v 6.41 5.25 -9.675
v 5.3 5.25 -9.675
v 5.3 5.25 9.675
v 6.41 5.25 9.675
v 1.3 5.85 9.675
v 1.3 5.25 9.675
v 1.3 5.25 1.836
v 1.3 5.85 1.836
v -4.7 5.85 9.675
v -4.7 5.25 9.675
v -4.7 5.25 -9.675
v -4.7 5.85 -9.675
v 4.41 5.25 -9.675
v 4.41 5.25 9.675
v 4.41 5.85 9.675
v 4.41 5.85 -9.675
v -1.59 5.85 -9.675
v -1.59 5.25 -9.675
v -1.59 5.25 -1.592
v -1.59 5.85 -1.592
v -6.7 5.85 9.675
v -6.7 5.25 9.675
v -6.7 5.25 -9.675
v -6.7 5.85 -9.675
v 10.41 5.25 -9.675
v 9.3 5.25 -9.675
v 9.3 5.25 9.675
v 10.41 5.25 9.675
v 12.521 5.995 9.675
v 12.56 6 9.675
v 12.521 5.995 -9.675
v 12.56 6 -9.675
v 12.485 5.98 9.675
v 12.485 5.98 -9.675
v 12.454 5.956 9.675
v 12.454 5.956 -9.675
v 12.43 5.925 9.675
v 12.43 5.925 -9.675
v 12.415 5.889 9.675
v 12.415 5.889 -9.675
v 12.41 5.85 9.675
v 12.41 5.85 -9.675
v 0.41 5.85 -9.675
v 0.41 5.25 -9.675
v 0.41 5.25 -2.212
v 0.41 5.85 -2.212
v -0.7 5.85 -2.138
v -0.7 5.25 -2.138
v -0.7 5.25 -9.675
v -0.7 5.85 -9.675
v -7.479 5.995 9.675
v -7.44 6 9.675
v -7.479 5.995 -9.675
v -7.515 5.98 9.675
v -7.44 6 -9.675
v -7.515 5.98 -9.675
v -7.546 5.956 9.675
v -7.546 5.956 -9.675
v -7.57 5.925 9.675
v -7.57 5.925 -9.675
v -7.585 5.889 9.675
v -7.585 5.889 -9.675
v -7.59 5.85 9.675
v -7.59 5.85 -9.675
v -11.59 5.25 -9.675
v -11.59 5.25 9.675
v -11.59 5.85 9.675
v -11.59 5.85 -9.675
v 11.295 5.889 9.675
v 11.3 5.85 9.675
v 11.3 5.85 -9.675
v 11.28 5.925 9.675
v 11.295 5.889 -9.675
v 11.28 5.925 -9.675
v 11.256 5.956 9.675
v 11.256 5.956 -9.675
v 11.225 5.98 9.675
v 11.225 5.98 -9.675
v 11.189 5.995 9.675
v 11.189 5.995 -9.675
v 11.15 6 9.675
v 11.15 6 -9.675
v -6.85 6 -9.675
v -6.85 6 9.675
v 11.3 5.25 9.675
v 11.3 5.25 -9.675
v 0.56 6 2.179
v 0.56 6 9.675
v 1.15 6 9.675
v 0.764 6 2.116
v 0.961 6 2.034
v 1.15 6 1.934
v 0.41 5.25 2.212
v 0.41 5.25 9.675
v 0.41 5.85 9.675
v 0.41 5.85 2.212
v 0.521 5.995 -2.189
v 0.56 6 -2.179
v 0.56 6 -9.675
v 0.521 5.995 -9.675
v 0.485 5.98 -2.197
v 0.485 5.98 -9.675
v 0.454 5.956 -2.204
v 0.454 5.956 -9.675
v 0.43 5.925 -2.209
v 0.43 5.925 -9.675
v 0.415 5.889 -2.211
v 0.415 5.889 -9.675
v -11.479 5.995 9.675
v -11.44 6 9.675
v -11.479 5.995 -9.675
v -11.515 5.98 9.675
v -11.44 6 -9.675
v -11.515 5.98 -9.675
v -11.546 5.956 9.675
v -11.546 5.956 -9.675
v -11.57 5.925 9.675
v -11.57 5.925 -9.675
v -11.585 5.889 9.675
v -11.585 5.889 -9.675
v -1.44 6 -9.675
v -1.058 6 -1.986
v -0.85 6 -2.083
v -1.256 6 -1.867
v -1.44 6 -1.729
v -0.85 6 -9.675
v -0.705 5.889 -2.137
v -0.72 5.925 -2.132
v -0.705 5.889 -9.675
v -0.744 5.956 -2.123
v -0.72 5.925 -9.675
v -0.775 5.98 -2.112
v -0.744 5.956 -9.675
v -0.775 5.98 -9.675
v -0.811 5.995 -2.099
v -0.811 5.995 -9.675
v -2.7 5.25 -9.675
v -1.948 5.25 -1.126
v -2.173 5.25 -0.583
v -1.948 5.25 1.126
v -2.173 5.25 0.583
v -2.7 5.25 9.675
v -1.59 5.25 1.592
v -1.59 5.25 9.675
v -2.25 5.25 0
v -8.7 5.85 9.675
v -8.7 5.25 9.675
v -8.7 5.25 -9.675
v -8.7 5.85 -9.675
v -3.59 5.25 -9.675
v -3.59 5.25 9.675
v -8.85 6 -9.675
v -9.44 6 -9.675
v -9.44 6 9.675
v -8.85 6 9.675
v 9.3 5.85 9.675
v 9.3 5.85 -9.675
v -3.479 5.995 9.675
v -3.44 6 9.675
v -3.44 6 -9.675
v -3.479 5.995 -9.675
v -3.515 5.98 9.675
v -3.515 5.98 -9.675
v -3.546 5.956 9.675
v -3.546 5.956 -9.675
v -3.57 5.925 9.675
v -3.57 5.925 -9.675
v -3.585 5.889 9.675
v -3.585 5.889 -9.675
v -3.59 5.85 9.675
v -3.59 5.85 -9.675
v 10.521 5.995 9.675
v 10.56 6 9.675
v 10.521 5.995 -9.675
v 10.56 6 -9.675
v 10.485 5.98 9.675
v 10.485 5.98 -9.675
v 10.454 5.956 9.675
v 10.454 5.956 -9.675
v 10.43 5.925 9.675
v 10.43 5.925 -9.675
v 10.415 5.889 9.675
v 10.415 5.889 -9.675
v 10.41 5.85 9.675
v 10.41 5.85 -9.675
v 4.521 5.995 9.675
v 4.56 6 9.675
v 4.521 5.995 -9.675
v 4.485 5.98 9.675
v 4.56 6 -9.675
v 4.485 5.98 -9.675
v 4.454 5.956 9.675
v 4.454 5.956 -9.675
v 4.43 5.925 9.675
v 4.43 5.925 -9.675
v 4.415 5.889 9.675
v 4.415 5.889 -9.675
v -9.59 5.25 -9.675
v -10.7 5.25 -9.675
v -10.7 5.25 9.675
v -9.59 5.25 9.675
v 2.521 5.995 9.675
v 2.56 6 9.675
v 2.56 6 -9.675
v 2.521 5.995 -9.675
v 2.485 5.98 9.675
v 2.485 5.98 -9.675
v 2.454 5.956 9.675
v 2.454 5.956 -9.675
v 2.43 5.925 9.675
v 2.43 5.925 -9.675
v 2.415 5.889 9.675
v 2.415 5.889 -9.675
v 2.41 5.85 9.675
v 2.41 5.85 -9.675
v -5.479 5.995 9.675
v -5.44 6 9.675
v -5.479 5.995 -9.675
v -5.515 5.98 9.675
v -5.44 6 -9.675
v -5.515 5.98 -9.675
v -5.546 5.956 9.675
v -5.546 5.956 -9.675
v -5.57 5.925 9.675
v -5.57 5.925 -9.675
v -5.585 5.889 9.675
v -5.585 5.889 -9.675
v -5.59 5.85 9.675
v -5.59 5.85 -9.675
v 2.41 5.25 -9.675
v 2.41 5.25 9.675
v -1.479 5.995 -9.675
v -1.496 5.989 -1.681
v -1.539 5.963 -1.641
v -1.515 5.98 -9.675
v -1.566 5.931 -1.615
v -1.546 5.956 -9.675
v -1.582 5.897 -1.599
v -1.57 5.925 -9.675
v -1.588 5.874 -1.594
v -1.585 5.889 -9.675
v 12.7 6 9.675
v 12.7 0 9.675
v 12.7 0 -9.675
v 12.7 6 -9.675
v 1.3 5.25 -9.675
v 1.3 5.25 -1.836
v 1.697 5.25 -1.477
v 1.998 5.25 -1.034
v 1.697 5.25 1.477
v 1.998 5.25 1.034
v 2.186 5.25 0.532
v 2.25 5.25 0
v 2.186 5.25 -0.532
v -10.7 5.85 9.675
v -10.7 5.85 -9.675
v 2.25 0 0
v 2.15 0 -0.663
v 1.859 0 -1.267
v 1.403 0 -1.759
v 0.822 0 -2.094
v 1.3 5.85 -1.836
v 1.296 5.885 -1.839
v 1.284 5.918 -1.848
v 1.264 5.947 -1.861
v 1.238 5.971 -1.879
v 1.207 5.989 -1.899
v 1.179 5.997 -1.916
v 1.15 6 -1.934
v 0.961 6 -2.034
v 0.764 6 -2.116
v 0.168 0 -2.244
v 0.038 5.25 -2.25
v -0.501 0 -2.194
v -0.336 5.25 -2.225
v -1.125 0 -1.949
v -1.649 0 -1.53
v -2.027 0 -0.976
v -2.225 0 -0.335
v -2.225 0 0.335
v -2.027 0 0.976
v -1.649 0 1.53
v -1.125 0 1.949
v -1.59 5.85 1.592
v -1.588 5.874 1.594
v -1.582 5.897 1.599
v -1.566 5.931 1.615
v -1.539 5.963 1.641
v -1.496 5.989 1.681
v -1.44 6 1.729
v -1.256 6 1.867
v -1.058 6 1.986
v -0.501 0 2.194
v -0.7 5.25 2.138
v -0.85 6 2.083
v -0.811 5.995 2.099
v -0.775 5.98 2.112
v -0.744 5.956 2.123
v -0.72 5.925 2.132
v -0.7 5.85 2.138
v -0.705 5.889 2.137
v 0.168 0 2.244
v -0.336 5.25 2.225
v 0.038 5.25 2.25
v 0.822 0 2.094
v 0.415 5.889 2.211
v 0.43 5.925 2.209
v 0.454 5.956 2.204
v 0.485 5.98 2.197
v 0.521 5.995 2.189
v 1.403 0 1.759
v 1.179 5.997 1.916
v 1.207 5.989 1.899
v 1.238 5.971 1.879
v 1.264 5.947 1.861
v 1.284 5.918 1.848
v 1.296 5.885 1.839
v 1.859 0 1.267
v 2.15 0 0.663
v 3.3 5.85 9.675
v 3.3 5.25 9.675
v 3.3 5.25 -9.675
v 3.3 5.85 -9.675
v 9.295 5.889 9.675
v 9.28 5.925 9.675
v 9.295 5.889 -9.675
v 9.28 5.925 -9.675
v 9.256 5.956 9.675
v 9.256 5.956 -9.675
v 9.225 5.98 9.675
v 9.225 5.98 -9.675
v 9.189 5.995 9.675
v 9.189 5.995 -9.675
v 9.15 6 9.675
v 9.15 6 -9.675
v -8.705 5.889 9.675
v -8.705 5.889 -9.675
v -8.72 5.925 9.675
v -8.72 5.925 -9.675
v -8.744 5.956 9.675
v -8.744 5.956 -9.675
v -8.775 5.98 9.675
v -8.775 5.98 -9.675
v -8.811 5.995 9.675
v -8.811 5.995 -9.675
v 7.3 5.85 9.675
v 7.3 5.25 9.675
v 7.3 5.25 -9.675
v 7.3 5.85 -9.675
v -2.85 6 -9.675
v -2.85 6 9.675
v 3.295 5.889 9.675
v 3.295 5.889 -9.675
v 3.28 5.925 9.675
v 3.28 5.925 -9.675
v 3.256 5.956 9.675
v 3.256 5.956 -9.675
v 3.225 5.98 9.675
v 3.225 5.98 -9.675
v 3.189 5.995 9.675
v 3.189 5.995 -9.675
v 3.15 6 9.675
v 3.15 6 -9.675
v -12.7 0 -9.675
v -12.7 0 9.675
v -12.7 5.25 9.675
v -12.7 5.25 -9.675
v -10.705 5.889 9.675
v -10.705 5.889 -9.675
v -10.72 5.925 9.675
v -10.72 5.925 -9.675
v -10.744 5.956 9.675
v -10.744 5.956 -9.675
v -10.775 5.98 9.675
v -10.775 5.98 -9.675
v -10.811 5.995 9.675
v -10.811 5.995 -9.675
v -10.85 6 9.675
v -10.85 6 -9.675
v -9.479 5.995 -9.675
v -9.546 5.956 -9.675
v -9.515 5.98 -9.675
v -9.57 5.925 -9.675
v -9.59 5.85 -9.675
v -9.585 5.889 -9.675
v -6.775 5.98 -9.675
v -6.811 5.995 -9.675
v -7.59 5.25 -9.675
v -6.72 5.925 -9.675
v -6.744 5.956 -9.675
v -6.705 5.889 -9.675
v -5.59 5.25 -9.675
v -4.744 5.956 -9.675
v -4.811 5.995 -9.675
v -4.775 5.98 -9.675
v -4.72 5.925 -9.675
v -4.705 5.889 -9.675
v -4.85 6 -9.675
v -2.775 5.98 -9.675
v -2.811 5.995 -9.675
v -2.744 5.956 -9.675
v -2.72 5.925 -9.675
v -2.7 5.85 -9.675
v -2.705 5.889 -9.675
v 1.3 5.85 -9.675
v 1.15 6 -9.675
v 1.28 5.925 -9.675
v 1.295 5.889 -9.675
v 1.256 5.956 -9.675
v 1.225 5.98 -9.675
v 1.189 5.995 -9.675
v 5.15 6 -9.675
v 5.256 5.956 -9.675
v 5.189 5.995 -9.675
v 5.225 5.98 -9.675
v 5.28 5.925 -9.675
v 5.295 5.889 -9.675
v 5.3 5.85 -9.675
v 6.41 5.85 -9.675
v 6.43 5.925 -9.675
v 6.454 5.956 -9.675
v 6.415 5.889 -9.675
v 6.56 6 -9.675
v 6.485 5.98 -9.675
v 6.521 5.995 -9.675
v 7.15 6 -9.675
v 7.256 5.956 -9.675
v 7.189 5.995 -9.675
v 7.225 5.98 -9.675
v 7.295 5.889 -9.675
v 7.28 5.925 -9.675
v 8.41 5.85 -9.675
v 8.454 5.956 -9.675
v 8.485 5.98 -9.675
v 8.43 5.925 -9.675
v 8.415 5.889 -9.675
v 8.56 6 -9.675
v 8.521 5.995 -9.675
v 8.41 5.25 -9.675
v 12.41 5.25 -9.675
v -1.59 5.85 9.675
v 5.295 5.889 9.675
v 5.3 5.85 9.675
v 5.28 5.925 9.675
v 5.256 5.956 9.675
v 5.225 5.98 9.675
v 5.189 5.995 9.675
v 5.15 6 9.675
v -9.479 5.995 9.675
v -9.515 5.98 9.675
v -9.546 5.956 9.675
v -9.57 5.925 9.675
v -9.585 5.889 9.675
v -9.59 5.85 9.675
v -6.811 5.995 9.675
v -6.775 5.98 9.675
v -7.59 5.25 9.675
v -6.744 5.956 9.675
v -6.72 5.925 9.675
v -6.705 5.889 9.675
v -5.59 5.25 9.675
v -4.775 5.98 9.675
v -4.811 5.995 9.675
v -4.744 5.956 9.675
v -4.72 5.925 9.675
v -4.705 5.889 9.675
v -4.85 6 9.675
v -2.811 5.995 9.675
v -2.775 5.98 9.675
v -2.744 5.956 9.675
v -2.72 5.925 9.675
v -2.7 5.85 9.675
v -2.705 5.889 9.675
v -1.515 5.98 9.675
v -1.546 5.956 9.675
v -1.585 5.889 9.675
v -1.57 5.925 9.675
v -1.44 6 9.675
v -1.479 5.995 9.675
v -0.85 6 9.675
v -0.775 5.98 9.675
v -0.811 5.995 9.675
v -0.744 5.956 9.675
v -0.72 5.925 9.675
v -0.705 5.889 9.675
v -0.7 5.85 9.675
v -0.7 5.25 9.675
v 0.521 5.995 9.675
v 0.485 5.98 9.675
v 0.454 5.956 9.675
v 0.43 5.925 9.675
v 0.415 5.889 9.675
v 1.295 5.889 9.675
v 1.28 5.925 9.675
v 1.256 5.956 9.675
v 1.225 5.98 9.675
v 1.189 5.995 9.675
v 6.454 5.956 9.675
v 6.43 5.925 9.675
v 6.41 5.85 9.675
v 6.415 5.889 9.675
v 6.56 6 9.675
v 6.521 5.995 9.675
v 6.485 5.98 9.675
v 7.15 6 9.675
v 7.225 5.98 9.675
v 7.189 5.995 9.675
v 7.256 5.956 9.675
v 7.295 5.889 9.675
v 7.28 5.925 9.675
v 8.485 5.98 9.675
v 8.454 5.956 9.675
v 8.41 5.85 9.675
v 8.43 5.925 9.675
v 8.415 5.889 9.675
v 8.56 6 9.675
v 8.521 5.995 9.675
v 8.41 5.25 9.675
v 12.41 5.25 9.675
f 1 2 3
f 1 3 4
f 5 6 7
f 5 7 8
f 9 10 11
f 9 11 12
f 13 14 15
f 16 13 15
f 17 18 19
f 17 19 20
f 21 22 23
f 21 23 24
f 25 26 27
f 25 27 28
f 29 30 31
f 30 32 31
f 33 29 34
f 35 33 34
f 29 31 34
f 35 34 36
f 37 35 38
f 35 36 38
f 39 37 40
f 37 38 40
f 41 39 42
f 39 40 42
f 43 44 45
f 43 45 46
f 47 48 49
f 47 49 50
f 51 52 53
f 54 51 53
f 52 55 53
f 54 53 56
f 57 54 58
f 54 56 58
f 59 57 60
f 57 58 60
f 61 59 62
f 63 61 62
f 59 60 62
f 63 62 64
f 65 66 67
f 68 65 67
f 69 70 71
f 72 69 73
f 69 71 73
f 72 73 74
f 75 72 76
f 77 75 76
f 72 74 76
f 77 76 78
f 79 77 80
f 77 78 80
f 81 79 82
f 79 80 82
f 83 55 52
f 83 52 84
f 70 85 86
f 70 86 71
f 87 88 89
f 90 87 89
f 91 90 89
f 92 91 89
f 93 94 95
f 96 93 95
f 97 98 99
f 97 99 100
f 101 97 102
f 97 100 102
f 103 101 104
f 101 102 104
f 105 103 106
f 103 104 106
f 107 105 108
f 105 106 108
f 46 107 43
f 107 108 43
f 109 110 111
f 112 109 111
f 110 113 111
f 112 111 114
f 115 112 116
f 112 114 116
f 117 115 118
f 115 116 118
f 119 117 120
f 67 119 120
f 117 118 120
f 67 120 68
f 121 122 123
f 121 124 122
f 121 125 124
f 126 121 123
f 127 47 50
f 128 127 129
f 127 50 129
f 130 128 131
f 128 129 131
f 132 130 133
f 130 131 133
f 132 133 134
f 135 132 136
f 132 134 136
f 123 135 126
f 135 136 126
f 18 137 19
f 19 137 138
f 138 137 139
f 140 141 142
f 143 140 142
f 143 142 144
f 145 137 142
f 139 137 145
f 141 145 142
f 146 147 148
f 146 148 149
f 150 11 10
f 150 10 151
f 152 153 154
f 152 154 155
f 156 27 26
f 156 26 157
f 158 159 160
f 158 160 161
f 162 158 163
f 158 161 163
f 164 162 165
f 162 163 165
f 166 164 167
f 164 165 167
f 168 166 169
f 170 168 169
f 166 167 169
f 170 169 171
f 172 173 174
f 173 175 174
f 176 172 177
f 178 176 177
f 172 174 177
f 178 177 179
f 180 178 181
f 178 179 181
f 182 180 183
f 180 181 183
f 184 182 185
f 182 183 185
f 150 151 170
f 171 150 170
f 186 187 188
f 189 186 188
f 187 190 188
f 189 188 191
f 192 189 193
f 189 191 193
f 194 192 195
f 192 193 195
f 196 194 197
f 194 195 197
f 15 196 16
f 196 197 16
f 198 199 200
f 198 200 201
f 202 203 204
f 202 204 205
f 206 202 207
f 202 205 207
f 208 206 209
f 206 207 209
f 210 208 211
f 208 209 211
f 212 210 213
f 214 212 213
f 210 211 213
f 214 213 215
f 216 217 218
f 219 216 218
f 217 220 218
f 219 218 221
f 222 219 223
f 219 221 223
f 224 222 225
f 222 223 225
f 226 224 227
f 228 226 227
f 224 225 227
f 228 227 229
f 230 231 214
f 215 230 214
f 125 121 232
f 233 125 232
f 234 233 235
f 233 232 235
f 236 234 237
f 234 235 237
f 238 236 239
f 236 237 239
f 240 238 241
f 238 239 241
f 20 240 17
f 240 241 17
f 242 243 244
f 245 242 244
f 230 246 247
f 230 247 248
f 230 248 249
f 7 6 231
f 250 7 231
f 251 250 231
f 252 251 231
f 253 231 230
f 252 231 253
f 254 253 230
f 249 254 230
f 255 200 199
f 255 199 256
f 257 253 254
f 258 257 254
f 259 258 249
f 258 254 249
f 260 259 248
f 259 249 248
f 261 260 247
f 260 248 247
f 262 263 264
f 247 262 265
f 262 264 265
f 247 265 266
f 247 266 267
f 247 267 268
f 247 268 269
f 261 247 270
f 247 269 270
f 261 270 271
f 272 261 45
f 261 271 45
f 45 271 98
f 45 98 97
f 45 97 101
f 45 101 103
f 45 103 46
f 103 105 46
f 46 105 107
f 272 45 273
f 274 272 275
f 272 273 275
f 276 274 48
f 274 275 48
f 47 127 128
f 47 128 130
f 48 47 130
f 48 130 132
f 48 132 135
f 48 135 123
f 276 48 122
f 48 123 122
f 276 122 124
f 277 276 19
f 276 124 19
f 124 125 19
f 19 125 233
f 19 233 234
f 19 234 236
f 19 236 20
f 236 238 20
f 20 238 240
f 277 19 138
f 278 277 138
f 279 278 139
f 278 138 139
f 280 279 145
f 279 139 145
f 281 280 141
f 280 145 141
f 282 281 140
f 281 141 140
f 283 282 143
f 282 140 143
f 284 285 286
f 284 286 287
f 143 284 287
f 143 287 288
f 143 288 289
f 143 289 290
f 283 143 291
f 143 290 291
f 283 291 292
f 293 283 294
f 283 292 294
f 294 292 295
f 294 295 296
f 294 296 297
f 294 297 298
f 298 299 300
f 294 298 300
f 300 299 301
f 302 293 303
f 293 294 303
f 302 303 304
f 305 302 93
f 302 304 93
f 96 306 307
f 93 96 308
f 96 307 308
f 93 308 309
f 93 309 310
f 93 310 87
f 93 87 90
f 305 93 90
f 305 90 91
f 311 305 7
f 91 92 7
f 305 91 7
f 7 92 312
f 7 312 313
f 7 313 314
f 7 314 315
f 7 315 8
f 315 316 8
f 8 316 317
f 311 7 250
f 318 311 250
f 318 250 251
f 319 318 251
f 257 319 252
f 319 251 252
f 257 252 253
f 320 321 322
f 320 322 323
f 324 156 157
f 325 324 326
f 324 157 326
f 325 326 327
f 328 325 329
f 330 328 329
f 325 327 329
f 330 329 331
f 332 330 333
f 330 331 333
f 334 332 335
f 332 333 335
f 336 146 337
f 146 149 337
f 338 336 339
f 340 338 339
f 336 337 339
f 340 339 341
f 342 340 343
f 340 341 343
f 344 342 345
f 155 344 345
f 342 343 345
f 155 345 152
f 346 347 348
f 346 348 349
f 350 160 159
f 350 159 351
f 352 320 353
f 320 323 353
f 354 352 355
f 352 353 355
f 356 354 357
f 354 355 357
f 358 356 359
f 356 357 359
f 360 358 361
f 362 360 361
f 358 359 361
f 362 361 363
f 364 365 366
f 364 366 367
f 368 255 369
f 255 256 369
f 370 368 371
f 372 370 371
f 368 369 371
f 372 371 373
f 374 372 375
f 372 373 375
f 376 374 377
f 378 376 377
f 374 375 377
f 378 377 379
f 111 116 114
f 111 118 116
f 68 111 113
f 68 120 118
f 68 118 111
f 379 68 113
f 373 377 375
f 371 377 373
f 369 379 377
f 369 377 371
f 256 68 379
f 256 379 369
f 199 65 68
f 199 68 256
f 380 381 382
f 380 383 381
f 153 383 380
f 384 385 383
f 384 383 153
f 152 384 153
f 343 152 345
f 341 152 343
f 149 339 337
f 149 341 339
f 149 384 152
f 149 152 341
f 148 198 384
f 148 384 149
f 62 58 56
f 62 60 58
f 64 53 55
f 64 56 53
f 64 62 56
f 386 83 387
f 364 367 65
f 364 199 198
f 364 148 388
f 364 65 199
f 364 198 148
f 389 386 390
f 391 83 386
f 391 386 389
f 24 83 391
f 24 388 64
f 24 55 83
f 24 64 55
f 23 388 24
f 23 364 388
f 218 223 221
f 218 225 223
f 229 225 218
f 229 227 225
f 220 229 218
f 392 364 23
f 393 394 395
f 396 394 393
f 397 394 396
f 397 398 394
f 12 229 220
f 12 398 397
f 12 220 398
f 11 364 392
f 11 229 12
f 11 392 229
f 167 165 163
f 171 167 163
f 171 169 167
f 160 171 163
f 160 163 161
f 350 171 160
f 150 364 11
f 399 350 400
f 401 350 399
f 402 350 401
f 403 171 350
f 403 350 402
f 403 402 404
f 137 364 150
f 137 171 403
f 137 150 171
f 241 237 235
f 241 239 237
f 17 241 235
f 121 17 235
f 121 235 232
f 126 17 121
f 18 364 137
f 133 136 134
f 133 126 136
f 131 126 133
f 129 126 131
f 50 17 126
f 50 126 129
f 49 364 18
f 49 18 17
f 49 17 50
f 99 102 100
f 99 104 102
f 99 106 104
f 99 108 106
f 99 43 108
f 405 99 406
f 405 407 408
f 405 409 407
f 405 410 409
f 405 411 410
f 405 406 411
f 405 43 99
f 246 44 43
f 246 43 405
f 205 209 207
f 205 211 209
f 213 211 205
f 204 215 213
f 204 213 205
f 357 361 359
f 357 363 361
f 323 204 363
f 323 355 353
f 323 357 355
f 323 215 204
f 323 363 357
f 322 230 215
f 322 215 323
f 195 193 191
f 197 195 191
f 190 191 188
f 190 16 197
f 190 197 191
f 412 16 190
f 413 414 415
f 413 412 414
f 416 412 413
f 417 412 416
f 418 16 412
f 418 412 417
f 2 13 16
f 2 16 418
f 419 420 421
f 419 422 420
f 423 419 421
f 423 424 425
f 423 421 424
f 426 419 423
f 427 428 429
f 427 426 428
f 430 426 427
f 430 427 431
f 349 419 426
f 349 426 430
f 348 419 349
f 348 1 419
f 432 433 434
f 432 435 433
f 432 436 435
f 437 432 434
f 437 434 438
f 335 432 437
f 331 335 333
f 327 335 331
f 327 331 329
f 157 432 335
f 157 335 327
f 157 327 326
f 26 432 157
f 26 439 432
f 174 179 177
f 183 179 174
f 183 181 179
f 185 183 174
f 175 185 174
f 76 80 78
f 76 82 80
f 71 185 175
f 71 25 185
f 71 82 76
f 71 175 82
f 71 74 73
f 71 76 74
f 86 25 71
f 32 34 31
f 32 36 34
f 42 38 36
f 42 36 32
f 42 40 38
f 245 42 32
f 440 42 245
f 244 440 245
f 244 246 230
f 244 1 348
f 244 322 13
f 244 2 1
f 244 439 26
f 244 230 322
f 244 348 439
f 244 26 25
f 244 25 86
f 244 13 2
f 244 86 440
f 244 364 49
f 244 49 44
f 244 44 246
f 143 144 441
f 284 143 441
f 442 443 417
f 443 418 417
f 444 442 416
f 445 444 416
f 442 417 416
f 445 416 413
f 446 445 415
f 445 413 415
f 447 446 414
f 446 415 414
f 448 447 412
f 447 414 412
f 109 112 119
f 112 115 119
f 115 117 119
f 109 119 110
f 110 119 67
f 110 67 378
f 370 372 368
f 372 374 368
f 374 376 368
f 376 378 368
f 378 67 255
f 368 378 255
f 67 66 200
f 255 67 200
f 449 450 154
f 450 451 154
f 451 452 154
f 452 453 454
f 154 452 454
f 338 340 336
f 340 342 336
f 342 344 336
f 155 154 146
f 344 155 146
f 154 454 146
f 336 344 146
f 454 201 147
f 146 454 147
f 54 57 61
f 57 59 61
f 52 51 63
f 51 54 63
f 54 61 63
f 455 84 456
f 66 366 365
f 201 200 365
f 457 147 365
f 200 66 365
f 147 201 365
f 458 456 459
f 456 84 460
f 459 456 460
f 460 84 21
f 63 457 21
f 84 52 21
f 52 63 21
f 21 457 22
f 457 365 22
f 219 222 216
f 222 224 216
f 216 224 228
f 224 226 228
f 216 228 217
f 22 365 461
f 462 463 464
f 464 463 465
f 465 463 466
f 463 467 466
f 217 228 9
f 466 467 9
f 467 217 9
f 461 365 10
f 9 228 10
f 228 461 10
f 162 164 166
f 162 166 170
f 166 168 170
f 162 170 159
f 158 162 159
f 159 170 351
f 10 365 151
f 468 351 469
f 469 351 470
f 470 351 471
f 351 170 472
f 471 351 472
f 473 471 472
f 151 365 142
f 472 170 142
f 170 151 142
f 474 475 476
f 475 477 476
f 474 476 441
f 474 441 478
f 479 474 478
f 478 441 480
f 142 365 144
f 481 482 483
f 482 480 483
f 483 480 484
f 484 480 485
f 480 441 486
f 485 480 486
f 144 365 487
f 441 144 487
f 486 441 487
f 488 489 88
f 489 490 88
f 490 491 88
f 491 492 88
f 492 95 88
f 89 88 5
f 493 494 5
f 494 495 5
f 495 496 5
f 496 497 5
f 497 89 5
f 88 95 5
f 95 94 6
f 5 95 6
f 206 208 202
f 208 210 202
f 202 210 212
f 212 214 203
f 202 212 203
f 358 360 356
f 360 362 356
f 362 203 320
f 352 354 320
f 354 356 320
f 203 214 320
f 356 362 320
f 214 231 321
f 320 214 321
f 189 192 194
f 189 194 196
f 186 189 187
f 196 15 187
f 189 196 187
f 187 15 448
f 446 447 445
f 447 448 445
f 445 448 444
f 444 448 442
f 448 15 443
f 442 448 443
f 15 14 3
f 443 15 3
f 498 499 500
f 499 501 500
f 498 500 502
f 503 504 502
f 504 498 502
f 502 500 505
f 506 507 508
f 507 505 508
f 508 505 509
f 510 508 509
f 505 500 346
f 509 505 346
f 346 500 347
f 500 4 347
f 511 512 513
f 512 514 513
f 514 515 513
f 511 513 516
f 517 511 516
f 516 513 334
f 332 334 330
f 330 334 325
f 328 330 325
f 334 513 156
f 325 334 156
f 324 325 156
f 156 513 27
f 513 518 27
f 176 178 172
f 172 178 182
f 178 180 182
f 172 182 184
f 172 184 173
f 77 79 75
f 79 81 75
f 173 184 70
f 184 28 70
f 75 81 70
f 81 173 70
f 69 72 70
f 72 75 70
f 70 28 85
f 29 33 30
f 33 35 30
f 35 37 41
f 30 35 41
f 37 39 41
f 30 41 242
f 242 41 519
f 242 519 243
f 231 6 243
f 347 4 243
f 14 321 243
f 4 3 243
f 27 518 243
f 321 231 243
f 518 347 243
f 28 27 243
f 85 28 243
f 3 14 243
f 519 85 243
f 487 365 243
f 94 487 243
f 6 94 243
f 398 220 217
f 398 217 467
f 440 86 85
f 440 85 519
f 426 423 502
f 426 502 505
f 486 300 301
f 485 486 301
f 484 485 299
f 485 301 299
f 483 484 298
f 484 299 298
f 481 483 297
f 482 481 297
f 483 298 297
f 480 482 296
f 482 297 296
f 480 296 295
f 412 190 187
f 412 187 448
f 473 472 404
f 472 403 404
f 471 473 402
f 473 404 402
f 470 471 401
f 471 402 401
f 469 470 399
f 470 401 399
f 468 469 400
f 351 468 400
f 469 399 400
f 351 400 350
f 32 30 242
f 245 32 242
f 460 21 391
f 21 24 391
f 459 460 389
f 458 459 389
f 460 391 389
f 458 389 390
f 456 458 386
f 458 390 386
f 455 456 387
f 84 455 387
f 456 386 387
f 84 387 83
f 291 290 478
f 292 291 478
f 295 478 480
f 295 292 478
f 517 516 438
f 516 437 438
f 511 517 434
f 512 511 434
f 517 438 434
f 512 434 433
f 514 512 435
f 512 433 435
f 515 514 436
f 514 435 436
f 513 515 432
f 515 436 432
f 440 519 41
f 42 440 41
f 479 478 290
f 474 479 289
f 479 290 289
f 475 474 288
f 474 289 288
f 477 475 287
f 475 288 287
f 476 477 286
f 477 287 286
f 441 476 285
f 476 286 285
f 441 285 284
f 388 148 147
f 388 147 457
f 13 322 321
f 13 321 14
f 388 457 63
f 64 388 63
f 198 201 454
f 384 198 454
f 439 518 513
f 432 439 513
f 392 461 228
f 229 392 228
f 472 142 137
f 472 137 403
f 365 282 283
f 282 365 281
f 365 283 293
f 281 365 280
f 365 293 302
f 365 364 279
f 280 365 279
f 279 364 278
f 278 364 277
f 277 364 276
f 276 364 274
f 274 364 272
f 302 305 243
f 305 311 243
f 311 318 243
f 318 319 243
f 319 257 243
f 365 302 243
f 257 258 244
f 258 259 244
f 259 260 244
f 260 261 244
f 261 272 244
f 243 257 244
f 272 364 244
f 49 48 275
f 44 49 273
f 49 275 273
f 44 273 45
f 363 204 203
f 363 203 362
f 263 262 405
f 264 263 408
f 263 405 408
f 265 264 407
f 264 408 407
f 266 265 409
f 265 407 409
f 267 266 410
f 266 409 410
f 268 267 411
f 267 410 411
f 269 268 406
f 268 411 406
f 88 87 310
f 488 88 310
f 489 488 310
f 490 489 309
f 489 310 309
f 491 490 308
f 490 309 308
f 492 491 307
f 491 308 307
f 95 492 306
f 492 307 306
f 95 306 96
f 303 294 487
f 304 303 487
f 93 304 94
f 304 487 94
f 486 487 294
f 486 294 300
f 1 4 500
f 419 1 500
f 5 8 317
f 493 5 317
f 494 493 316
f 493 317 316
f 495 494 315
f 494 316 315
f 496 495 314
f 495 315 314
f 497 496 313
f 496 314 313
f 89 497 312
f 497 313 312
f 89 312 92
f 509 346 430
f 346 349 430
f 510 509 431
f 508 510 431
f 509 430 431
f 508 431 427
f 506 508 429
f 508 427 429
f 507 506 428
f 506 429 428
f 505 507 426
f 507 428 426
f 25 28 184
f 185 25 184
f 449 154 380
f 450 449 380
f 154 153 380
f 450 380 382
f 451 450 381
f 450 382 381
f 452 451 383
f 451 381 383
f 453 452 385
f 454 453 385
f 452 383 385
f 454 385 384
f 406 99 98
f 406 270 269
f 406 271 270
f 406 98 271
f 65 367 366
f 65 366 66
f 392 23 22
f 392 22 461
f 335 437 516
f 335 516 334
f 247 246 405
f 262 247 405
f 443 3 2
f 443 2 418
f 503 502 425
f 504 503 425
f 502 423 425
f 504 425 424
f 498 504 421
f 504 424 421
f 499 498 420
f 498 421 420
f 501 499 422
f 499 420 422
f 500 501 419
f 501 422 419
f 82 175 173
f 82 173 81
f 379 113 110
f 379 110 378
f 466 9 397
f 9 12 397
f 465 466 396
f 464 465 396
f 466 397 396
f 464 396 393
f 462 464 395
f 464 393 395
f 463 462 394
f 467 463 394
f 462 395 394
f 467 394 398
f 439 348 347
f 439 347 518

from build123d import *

# Parameters (mm, degrees)
SKETCH1_W            = 25.4
SKETCH1_H            = 19.35
BOSS_EXTRUDE1_DEPTH  = 6
SKETCH2_W            = 1.11
SKETCH2_H            = 0.75
CUT_EXTRUDE3_DEPTH   = 24.910510241
LPATTERN2_COUNT      = 13
LPATTERN2_PITCH      = 2
FILLET1_R            = 0.15
M4_CLEARANCE_HOLE1_D = 4.5


with BuildPart() as part:
    # Sketch1 → Boss-Extrude1 (new body)
    with BuildSketch(Plane(origin=(0, 0, 0), x_dir=(1, 0, 0), z_dir=(0, 1, 0))):
        Rectangle(SKETCH1_W, SKETCH1_H)
    extrude(amount=BOSS_EXTRUDE1_DEPTH)

    # Sketch2 → Cut-Extrude3 (cut, through all)
    with BuildSketch(Plane.XY.offset(9.675)):
        with Locations((-12.145, 5.625)):
            Rectangle(SKETCH2_W, SKETCH2_H)
    cut_extrude3 = extrude(amount=-CUT_EXTRUDE3_DEPTH, mode=Mode.SUBTRACT)

    # LPattern2: Cut-Extrude3 ×13
    with Locations(*[(i * LPATTERN2_PITCH, 0, 0) for i in range(1, LPATTERN2_COUNT)]):
        add(cut_extrude3, mode=Mode.SUBTRACT)

    # Fillet1
    fillet1_edges = [part.edges().sort_by_distance(p)[0] for p in [
        (-6.7, 6, 0),
        (-5.59, 6, 0),
        (-4.7, 6, 0),
        (-3.59, 6, 0),
        (-2.7, 6, 0),
        (-1.59, 6, 0),
        (-0.7, 6, 0),
        (0.41, 6, 0),
        (1.3, 6, 0),
        (2.41, 6, 0),
        (3.3, 6, 0),
        (4.41, 6, 0),
        (5.3, 6, 0),
        (6.41, 6, 0),
        (7.3, 6, 0),
        (8.41, 6, 0),
        (9.3, 6, 0),
        (10.41, 6, 0),
        (11.3, 6, 0),
        (12.41, 6, 0),
        (-11.59, 6, 0),
        (-10.7, 6, 0),
        (-9.59, 6, 0),
        (-8.7, 6, 0),
        (-7.59, 6, 0),
    ]]
    fillet(fillet1_edges, radius=FILLET1_R)

    # M4 Clearance Hole1 (through all)
    with Locations(Plane(origin=(0, 0, 0), x_dir=(-1, 0, 0), z_dir=(0, -1, 0))):
        with Locations((0, 0)):
            Hole(M4_CLEARANCE_HOLE1_D / 2)


solid = part.part
